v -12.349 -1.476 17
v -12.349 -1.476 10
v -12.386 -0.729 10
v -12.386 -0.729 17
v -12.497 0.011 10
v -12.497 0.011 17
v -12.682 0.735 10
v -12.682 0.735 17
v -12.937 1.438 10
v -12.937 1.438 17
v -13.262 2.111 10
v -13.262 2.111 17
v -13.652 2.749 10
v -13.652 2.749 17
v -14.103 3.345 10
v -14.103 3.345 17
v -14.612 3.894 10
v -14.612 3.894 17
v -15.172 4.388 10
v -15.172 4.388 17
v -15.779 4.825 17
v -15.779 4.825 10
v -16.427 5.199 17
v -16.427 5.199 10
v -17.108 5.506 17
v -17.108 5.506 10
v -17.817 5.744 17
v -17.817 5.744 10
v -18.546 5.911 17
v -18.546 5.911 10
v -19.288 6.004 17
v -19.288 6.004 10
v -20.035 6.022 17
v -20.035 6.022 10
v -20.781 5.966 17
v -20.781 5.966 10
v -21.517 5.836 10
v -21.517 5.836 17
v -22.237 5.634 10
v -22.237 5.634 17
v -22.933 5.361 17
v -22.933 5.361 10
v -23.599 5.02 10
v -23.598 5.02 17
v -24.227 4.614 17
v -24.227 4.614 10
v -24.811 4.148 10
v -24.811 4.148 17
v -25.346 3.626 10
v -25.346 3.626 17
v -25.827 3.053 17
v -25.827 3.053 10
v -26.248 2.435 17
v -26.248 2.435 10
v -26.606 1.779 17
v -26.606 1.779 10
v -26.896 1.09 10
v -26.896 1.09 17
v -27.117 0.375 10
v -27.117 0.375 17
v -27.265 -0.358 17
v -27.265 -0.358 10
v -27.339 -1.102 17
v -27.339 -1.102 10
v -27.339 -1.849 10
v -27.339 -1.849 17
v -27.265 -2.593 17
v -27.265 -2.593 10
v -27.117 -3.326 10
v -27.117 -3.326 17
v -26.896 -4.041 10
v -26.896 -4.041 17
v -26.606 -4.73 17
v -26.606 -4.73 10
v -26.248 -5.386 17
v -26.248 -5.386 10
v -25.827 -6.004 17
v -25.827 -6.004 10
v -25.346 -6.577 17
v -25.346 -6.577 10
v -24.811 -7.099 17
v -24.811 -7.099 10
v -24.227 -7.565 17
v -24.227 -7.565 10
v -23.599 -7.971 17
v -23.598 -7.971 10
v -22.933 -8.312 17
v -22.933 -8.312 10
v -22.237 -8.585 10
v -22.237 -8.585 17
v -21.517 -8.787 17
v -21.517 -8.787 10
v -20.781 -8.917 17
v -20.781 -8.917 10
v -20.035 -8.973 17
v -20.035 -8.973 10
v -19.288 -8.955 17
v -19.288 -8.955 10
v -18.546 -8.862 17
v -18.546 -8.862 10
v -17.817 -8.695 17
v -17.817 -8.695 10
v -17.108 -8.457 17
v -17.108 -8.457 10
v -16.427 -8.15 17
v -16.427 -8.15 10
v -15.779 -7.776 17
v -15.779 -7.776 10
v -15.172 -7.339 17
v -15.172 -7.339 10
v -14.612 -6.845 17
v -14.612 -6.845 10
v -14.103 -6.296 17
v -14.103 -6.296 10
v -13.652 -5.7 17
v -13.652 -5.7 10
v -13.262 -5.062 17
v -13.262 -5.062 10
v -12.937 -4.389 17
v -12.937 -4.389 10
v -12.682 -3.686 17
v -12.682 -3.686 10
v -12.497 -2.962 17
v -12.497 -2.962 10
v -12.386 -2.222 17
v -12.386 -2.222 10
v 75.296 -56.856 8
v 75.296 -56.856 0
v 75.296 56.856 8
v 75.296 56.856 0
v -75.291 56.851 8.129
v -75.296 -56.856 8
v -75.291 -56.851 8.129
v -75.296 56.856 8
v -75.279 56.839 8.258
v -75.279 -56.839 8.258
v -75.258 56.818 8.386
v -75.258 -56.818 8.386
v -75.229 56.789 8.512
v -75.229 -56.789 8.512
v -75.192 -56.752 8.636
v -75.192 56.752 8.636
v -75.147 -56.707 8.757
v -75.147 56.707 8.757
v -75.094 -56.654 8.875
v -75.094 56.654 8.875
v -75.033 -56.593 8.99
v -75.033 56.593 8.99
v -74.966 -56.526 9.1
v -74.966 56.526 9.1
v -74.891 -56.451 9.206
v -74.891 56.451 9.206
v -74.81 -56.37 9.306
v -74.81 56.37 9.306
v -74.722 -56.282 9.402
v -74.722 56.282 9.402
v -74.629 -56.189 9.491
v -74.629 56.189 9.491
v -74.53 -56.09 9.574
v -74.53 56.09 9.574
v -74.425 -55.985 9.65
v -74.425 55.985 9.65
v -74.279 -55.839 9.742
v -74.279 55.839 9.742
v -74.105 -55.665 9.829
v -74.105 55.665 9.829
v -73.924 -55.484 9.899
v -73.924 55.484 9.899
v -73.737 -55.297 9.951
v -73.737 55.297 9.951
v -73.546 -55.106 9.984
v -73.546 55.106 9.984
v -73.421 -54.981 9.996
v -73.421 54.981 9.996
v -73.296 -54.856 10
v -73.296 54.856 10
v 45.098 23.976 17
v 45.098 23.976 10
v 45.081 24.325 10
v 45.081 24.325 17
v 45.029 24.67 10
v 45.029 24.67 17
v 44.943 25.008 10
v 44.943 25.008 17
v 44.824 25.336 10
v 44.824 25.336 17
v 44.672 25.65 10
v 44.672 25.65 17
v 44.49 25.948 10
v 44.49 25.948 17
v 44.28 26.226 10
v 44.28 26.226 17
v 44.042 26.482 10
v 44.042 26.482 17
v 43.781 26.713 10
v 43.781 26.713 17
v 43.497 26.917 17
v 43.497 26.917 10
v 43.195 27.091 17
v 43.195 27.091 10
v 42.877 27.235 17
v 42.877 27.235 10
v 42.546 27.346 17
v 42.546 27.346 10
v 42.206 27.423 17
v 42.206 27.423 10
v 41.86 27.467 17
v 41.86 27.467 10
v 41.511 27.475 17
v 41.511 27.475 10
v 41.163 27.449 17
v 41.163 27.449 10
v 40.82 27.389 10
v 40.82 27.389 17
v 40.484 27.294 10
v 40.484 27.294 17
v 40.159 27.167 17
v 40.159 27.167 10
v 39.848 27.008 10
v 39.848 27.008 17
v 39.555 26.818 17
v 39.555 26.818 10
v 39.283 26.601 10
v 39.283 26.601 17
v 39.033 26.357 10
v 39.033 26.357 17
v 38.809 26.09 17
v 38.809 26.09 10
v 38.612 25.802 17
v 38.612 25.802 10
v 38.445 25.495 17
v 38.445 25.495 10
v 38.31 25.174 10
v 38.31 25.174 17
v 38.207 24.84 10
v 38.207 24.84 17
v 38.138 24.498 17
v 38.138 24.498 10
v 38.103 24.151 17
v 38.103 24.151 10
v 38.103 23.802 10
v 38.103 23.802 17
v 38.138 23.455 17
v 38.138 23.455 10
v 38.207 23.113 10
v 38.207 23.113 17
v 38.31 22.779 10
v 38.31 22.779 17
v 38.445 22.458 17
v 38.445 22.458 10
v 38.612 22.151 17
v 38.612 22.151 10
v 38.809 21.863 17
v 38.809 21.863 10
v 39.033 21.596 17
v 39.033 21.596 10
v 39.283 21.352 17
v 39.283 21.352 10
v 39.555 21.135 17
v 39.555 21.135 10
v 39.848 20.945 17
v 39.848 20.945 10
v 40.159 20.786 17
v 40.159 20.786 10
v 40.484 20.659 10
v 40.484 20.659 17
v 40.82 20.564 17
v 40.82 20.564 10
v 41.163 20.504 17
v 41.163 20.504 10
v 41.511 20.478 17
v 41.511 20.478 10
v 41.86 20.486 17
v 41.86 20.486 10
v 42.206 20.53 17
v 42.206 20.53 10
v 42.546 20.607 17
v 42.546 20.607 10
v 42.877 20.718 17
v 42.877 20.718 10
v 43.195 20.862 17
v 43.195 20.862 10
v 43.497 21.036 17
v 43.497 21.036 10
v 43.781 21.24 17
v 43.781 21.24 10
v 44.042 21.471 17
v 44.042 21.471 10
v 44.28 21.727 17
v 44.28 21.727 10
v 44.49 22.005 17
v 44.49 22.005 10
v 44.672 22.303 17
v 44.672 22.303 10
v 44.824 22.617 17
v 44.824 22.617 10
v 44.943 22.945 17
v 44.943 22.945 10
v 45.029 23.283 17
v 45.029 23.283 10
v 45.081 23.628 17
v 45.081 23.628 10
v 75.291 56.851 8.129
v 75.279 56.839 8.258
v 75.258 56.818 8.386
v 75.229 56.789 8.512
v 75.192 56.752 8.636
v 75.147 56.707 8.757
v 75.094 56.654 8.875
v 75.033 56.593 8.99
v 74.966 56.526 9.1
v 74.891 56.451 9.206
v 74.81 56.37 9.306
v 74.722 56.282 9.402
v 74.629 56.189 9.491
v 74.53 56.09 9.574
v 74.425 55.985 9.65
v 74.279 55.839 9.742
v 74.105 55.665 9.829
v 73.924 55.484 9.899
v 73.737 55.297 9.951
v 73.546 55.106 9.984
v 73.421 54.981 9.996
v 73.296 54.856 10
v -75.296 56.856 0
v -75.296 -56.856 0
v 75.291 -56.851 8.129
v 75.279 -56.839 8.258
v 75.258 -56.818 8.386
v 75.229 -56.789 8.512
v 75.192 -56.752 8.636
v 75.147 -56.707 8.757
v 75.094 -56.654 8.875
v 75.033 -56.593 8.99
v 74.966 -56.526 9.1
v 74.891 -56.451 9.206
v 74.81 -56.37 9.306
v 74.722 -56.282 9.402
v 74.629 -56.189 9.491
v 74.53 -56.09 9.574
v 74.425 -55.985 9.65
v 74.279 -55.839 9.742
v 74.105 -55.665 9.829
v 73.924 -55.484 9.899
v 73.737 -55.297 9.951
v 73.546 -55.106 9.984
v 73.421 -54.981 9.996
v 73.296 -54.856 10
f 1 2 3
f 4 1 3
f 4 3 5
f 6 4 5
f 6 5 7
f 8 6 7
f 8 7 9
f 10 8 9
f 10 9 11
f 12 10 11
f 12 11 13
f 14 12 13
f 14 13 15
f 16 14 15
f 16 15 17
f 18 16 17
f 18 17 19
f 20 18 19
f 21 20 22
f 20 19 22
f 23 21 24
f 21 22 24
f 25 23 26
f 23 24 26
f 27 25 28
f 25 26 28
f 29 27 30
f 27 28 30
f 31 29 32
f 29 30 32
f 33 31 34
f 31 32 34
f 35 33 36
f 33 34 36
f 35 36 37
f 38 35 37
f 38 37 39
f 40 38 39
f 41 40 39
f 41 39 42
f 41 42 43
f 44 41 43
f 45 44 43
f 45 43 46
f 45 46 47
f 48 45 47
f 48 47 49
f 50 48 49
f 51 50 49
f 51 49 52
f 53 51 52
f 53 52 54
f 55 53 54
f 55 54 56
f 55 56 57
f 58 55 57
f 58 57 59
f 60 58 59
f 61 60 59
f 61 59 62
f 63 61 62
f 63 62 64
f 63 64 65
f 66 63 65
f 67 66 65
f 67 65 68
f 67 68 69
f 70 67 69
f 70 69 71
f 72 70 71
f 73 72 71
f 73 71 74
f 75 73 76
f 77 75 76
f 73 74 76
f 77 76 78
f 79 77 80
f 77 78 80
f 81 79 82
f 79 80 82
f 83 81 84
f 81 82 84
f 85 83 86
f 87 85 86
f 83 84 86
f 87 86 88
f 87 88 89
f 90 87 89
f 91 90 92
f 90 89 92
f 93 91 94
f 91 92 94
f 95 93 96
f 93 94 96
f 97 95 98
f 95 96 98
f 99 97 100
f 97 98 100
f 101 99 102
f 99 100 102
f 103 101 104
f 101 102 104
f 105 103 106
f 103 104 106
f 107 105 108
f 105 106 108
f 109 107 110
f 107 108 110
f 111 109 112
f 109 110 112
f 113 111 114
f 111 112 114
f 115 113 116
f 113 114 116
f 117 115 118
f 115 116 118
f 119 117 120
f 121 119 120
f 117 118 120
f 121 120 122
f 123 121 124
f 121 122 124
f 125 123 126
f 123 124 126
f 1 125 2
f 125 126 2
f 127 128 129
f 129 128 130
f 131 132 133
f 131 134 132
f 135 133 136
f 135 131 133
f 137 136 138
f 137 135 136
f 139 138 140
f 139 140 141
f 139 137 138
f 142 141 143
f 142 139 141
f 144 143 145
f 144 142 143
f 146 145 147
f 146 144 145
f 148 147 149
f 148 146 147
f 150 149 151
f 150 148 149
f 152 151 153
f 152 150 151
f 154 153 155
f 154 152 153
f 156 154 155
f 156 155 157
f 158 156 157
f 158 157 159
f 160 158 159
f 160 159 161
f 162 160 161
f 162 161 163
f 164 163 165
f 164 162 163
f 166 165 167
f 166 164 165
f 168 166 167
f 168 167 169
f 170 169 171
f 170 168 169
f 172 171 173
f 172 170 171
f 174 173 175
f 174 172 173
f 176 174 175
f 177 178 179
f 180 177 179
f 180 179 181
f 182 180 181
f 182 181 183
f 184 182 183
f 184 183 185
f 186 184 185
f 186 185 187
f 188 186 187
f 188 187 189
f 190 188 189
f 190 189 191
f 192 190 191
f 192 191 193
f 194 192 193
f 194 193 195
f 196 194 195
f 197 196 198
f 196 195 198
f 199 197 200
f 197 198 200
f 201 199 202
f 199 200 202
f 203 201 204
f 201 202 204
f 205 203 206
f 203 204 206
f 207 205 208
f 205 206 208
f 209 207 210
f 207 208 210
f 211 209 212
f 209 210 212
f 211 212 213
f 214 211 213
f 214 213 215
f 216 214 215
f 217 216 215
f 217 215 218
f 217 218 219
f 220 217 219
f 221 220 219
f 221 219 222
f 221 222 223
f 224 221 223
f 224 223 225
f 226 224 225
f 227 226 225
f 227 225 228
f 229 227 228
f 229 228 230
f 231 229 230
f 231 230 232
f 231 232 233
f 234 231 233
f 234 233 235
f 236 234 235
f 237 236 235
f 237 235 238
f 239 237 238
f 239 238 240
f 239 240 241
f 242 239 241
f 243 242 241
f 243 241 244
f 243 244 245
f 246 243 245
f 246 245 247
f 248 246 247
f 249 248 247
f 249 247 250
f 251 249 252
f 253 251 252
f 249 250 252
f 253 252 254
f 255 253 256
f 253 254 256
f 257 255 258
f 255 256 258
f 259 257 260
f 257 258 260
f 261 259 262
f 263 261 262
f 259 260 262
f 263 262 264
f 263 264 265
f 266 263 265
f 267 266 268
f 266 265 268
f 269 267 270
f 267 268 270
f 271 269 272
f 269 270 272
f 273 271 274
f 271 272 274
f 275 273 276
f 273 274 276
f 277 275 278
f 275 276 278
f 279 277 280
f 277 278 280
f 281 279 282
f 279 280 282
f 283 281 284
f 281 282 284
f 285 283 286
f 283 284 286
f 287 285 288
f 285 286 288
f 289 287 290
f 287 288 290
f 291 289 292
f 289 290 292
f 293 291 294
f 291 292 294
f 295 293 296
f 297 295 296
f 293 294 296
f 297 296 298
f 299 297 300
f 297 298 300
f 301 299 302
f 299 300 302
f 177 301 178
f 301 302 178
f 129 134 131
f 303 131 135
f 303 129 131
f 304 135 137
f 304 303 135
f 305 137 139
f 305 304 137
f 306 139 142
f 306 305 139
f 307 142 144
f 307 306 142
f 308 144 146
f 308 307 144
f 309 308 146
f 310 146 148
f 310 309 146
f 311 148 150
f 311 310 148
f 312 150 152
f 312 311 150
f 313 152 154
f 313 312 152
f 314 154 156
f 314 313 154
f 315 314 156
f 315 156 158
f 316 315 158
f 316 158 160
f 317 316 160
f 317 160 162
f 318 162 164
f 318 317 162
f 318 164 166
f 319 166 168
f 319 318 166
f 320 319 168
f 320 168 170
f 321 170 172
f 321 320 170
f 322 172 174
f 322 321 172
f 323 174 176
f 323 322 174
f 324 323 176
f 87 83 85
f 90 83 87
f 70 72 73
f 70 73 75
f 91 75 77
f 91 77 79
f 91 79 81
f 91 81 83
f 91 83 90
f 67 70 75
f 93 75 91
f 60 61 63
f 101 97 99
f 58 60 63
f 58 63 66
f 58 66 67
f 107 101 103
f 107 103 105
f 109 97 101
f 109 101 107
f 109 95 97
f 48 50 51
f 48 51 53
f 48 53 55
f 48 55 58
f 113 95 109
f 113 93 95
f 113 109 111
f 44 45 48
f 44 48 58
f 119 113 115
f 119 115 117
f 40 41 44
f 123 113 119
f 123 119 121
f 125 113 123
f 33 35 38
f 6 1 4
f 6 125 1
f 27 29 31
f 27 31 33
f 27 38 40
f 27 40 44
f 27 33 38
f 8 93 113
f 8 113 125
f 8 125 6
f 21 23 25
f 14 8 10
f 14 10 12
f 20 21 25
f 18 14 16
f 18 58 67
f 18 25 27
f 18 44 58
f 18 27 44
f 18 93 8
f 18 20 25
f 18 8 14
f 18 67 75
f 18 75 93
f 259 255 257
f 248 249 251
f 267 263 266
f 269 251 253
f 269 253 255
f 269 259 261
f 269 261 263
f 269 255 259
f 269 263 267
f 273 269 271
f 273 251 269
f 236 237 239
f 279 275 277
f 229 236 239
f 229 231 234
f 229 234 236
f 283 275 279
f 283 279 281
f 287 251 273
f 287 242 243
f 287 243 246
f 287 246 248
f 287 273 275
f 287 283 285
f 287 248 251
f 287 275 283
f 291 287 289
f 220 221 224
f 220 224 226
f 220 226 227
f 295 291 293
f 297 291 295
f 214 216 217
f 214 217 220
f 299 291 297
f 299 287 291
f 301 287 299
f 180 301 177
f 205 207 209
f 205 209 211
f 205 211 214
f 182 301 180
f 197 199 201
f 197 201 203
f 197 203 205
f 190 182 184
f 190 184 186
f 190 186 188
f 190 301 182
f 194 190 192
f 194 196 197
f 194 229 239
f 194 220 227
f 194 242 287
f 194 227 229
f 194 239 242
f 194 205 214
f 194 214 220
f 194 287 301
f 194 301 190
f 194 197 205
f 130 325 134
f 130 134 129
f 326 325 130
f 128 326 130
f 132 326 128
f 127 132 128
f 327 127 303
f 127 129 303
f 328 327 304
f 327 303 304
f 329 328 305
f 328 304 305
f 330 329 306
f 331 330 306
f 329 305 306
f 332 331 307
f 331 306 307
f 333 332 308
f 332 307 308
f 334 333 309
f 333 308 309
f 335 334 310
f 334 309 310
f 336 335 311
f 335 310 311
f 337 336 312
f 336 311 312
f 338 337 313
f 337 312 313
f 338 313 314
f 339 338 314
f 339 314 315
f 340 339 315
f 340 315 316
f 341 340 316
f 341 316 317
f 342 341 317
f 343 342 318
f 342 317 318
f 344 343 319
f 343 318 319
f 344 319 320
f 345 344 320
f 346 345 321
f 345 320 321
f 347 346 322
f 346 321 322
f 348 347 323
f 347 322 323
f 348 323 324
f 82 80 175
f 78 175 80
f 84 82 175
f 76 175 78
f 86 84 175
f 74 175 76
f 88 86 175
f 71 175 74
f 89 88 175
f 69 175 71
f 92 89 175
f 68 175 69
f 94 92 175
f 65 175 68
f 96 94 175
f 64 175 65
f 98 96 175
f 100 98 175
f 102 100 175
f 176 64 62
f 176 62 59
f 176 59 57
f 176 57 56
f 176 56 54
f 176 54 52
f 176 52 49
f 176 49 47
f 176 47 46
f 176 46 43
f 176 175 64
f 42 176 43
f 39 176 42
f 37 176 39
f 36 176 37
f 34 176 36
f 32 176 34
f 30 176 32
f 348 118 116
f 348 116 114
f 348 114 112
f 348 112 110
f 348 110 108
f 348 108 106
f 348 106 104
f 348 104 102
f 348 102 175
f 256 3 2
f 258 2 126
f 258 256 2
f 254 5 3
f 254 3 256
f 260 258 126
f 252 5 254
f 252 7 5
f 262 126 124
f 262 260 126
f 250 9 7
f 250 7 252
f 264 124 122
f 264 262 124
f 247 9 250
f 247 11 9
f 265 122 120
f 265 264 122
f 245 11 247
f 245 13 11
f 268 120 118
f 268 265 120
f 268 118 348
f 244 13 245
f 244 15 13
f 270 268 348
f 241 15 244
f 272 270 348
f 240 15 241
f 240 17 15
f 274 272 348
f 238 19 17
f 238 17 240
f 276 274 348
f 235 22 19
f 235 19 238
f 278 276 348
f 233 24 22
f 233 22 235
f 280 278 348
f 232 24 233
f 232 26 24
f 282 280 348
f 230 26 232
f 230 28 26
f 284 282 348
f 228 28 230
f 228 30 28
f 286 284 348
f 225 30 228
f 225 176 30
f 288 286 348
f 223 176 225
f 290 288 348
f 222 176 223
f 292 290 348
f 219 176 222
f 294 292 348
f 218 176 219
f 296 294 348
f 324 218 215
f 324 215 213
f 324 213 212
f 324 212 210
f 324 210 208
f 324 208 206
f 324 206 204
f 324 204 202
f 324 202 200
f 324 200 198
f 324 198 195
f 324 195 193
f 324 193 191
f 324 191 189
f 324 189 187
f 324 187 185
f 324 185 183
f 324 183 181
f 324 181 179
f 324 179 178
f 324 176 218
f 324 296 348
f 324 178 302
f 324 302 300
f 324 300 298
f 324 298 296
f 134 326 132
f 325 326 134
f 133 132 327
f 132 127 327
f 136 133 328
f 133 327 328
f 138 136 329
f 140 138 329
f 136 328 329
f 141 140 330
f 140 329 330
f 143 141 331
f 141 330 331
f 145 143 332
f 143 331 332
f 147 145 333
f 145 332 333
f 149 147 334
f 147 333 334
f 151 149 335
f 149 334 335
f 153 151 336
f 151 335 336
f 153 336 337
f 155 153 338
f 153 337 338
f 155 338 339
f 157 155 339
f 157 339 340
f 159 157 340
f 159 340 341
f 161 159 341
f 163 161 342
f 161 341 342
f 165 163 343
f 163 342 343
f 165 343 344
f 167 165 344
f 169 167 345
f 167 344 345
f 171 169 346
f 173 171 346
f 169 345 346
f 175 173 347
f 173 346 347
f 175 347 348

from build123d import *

# Parameters (mm, degrees)
F0_W     = 150.591
F0_H     = 113.711
F0_R     = 7.5
F0_R_2   = 3.5
F1_DEPTH = 10
F2_R     = 2
F3_DEPTH = 17


with BuildPart() as f1:
    # F0 (on Top) → F1 (new body)
    with BuildSketch(Plane.XY):
        Rectangle(F0_W, F0_H)
        with Locations((-19.8485, -1.4755)):
            Circle(F0_R, mode=Mode.SUBTRACT)
        with Locations((41.5985, 23.9765)):
            Circle(F0_R_2, mode=Mode.SUBTRACT)
        with Locations((-19.8485, -1.4755)):
            Circle(F0_R)
        with Locations((41.5985, 23.9765)):
            Circle(F0_R_2)
    extrude(amount=F1_DEPTH)

    # F2
    f2_edges = [f1.edges().sort_by_distance(p)[0] for p in [
        (0, -56.8555, 10),
        (-75.2955, 0, 10),
        (0, 56.8555, 10),
        (75.2955, 0, 10),
    ]]
    fillet(f2_edges, radius=F2_R)

    # F0 (on Top) → F3 (join)
    with BuildSketch(Plane.XY):
        with Locations((-19.8485, -1.4755)):
            Circle(F0_R)
        with Locations((41.5985, 23.9765)):
            Circle(F0_R_2)
    extrude(amount=F3_DEPTH)


solid = f1.part
